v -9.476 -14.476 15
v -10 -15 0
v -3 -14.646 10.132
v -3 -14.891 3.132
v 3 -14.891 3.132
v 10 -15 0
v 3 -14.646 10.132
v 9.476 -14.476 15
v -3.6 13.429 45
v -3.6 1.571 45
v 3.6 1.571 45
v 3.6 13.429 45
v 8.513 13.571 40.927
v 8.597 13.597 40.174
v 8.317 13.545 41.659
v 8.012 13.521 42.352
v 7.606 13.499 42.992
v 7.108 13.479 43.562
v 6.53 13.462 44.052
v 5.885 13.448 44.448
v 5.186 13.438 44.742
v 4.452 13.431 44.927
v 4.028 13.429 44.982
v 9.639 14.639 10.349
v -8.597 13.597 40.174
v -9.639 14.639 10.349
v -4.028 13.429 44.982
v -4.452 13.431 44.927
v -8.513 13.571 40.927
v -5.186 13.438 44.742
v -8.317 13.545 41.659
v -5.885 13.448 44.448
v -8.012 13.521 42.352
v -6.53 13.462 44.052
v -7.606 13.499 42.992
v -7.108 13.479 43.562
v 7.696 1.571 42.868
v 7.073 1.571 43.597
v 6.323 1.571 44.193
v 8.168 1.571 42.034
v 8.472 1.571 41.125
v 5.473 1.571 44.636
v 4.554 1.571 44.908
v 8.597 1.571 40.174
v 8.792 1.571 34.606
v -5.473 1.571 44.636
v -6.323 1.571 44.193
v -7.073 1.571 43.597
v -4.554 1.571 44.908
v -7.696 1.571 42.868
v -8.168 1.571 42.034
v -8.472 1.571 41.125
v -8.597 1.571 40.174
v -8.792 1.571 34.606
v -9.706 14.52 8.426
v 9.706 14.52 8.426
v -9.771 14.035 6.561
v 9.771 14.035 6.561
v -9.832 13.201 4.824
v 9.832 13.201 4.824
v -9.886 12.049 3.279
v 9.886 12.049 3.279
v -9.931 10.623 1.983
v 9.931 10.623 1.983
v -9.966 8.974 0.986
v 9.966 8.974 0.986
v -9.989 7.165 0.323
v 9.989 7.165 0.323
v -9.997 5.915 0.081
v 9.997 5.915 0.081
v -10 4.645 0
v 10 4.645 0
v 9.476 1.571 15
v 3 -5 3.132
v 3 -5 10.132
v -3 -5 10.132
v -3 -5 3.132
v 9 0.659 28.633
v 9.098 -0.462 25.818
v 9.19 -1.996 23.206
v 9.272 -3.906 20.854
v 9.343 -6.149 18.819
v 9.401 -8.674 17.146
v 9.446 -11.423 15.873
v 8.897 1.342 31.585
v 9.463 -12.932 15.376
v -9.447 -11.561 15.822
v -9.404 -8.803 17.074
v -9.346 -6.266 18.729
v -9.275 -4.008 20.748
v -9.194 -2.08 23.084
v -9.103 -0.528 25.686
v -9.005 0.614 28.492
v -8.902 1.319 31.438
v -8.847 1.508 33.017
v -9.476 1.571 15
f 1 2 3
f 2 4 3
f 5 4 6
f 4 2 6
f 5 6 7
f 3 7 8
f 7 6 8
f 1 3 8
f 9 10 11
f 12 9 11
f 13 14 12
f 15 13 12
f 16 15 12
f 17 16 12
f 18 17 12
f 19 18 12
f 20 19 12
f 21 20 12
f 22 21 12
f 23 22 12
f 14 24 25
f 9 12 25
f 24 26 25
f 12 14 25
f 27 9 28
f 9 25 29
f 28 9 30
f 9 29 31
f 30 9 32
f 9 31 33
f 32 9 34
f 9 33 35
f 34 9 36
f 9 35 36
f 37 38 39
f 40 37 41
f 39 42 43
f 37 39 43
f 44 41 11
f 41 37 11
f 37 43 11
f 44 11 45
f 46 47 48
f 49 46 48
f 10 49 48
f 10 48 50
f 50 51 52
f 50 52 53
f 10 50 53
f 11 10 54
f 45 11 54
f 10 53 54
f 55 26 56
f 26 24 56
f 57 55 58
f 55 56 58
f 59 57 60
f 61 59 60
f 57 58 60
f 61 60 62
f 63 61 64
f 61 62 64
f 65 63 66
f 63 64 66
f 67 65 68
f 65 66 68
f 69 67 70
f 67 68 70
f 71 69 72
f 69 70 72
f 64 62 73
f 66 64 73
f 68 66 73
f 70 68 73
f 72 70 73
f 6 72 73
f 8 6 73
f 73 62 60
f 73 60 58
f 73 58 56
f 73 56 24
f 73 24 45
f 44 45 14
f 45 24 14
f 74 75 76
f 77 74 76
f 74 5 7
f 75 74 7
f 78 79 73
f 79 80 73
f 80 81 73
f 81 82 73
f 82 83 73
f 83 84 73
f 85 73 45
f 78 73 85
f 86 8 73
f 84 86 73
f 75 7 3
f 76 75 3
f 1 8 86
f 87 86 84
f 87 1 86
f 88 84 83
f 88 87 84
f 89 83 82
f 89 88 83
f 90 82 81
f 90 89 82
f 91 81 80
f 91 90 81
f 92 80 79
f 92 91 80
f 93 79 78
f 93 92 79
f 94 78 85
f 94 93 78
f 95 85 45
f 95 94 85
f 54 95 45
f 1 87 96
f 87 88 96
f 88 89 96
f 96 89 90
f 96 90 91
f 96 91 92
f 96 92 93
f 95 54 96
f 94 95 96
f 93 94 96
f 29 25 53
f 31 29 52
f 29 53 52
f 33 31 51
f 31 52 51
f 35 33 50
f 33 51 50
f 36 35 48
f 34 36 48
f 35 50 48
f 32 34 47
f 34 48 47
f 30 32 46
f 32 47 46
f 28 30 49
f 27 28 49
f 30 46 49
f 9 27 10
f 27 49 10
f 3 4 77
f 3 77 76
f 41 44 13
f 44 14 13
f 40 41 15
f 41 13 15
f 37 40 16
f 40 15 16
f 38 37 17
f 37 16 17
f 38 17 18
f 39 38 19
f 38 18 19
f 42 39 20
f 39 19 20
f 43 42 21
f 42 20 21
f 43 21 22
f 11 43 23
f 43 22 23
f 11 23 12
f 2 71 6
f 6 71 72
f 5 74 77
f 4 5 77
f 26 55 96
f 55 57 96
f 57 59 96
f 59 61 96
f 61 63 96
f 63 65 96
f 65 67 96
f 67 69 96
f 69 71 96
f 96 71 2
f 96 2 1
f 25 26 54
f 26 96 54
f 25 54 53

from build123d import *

# Parameters (mm, degrees)
F0_W        = 20
F0_H        = 30
F1_DEPTH    = 45
F1_TAPER    = 2
F4_DEPTH    = 20.001
F5_T4_DEPTH = 116.9802704864
F7_W        = 6
F7_H        = 7
F8_DEPTH    = 10
F9_R        = 5
F10_R       = 10


# Not quite as in the source:
# - a fillet or chamfer that OpenCascade refuses, or shapes differently, is made with other operations: its cross-section is extruded or revolved along the edge and cut away or added


with BuildPart() as f1:
    # F0 (on Top) → F1 (new body)
    with BuildSketch(Plane.XY):
        Rectangle(F0_W, F0_H)
    extrude(amount=F1_DEPTH, taper=F1_TAPER)

    # F3 (on face) → F4 (cut, through all)
    with BuildSketch(Plane(origin=(-10, 0, 0), x_dir=(0, -1, 0), z_dir=(-1, 0, 0))):
        Polygon((14.4761884576, 15), (13.4285653729, 45), (-1.5714346271, 45), (-1.5714346271, 15), (13.4285653729, 15), align=None)
    extrude(amount=-F4_DEPTH, mode=Mode.SUBTRACT)

    # F5: fillet of radius 20 on 1 edges, made by hand


with BuildPart() as f5_tool2:
    # F5_s3 → F5_t4 (new body)
    with BuildSketch(Plane.YZ.offset(-58.4901352432)):
        with BuildLine():
            ThreePointArc((-14.4761884576, 15), (-2.9520099049, 21.9376573833), (1.5714346271, 34.6055787142))
            Line((1.5714346271, 34.6055787142), (1.5714346271, 15))
            Line((1.5714346271, 15), (-14.4761884576, 15))
        make_face()
    extrude(amount=F5_T4_DEPTH)

    split(bisect_by=Plane(origin=(-9.9878202513, 0, 0.3487823687), x_dir=(0, 1, 0), z_dir=(0.999390827, 0, -0.0348994967)), keep=Keep.TOP)

    split(bisect_by=Plane(origin=(9.9878202513, 0, 0.3487823687), x_dir=(0, 1, 0), z_dir=(-0.999390827, 0, -0.0348994967)), keep=Keep.TOP)


with BuildPart() as f1_1:
    add(f1.part)

    # F5_t1: union F5_tool2
    add(f5_tool2.part)

    # F7 (on face) → F8 (cut)
    with BuildSketch(Plane(origin=(0, -15, 0), x_dir=(-1, 0, 0), z_dir=(0, 1, 0))):
        with Locations((0, 6.6315173171)):
            Rectangle(F7_W, F7_H)
    extrude(amount=F8_DEPTH, mode=Mode.SUBTRACT)

    # F9
    f9_edges = [f1_1.edges().sort_by_distance(p)[0] for p in [
        (-8.428565, 7.5, 45),
        (8.428565, 7.5, 45),
    ]]
    fillet(f9_edges, radius=F9_R)

    # F10
    f10_edges = [f1_1.edges().sort_by_distance(p)[0] for p in [
        (0, 15, 0),
    ]]
    fillet(f10_edges, radius=F10_R)


solid = f1_1.part
